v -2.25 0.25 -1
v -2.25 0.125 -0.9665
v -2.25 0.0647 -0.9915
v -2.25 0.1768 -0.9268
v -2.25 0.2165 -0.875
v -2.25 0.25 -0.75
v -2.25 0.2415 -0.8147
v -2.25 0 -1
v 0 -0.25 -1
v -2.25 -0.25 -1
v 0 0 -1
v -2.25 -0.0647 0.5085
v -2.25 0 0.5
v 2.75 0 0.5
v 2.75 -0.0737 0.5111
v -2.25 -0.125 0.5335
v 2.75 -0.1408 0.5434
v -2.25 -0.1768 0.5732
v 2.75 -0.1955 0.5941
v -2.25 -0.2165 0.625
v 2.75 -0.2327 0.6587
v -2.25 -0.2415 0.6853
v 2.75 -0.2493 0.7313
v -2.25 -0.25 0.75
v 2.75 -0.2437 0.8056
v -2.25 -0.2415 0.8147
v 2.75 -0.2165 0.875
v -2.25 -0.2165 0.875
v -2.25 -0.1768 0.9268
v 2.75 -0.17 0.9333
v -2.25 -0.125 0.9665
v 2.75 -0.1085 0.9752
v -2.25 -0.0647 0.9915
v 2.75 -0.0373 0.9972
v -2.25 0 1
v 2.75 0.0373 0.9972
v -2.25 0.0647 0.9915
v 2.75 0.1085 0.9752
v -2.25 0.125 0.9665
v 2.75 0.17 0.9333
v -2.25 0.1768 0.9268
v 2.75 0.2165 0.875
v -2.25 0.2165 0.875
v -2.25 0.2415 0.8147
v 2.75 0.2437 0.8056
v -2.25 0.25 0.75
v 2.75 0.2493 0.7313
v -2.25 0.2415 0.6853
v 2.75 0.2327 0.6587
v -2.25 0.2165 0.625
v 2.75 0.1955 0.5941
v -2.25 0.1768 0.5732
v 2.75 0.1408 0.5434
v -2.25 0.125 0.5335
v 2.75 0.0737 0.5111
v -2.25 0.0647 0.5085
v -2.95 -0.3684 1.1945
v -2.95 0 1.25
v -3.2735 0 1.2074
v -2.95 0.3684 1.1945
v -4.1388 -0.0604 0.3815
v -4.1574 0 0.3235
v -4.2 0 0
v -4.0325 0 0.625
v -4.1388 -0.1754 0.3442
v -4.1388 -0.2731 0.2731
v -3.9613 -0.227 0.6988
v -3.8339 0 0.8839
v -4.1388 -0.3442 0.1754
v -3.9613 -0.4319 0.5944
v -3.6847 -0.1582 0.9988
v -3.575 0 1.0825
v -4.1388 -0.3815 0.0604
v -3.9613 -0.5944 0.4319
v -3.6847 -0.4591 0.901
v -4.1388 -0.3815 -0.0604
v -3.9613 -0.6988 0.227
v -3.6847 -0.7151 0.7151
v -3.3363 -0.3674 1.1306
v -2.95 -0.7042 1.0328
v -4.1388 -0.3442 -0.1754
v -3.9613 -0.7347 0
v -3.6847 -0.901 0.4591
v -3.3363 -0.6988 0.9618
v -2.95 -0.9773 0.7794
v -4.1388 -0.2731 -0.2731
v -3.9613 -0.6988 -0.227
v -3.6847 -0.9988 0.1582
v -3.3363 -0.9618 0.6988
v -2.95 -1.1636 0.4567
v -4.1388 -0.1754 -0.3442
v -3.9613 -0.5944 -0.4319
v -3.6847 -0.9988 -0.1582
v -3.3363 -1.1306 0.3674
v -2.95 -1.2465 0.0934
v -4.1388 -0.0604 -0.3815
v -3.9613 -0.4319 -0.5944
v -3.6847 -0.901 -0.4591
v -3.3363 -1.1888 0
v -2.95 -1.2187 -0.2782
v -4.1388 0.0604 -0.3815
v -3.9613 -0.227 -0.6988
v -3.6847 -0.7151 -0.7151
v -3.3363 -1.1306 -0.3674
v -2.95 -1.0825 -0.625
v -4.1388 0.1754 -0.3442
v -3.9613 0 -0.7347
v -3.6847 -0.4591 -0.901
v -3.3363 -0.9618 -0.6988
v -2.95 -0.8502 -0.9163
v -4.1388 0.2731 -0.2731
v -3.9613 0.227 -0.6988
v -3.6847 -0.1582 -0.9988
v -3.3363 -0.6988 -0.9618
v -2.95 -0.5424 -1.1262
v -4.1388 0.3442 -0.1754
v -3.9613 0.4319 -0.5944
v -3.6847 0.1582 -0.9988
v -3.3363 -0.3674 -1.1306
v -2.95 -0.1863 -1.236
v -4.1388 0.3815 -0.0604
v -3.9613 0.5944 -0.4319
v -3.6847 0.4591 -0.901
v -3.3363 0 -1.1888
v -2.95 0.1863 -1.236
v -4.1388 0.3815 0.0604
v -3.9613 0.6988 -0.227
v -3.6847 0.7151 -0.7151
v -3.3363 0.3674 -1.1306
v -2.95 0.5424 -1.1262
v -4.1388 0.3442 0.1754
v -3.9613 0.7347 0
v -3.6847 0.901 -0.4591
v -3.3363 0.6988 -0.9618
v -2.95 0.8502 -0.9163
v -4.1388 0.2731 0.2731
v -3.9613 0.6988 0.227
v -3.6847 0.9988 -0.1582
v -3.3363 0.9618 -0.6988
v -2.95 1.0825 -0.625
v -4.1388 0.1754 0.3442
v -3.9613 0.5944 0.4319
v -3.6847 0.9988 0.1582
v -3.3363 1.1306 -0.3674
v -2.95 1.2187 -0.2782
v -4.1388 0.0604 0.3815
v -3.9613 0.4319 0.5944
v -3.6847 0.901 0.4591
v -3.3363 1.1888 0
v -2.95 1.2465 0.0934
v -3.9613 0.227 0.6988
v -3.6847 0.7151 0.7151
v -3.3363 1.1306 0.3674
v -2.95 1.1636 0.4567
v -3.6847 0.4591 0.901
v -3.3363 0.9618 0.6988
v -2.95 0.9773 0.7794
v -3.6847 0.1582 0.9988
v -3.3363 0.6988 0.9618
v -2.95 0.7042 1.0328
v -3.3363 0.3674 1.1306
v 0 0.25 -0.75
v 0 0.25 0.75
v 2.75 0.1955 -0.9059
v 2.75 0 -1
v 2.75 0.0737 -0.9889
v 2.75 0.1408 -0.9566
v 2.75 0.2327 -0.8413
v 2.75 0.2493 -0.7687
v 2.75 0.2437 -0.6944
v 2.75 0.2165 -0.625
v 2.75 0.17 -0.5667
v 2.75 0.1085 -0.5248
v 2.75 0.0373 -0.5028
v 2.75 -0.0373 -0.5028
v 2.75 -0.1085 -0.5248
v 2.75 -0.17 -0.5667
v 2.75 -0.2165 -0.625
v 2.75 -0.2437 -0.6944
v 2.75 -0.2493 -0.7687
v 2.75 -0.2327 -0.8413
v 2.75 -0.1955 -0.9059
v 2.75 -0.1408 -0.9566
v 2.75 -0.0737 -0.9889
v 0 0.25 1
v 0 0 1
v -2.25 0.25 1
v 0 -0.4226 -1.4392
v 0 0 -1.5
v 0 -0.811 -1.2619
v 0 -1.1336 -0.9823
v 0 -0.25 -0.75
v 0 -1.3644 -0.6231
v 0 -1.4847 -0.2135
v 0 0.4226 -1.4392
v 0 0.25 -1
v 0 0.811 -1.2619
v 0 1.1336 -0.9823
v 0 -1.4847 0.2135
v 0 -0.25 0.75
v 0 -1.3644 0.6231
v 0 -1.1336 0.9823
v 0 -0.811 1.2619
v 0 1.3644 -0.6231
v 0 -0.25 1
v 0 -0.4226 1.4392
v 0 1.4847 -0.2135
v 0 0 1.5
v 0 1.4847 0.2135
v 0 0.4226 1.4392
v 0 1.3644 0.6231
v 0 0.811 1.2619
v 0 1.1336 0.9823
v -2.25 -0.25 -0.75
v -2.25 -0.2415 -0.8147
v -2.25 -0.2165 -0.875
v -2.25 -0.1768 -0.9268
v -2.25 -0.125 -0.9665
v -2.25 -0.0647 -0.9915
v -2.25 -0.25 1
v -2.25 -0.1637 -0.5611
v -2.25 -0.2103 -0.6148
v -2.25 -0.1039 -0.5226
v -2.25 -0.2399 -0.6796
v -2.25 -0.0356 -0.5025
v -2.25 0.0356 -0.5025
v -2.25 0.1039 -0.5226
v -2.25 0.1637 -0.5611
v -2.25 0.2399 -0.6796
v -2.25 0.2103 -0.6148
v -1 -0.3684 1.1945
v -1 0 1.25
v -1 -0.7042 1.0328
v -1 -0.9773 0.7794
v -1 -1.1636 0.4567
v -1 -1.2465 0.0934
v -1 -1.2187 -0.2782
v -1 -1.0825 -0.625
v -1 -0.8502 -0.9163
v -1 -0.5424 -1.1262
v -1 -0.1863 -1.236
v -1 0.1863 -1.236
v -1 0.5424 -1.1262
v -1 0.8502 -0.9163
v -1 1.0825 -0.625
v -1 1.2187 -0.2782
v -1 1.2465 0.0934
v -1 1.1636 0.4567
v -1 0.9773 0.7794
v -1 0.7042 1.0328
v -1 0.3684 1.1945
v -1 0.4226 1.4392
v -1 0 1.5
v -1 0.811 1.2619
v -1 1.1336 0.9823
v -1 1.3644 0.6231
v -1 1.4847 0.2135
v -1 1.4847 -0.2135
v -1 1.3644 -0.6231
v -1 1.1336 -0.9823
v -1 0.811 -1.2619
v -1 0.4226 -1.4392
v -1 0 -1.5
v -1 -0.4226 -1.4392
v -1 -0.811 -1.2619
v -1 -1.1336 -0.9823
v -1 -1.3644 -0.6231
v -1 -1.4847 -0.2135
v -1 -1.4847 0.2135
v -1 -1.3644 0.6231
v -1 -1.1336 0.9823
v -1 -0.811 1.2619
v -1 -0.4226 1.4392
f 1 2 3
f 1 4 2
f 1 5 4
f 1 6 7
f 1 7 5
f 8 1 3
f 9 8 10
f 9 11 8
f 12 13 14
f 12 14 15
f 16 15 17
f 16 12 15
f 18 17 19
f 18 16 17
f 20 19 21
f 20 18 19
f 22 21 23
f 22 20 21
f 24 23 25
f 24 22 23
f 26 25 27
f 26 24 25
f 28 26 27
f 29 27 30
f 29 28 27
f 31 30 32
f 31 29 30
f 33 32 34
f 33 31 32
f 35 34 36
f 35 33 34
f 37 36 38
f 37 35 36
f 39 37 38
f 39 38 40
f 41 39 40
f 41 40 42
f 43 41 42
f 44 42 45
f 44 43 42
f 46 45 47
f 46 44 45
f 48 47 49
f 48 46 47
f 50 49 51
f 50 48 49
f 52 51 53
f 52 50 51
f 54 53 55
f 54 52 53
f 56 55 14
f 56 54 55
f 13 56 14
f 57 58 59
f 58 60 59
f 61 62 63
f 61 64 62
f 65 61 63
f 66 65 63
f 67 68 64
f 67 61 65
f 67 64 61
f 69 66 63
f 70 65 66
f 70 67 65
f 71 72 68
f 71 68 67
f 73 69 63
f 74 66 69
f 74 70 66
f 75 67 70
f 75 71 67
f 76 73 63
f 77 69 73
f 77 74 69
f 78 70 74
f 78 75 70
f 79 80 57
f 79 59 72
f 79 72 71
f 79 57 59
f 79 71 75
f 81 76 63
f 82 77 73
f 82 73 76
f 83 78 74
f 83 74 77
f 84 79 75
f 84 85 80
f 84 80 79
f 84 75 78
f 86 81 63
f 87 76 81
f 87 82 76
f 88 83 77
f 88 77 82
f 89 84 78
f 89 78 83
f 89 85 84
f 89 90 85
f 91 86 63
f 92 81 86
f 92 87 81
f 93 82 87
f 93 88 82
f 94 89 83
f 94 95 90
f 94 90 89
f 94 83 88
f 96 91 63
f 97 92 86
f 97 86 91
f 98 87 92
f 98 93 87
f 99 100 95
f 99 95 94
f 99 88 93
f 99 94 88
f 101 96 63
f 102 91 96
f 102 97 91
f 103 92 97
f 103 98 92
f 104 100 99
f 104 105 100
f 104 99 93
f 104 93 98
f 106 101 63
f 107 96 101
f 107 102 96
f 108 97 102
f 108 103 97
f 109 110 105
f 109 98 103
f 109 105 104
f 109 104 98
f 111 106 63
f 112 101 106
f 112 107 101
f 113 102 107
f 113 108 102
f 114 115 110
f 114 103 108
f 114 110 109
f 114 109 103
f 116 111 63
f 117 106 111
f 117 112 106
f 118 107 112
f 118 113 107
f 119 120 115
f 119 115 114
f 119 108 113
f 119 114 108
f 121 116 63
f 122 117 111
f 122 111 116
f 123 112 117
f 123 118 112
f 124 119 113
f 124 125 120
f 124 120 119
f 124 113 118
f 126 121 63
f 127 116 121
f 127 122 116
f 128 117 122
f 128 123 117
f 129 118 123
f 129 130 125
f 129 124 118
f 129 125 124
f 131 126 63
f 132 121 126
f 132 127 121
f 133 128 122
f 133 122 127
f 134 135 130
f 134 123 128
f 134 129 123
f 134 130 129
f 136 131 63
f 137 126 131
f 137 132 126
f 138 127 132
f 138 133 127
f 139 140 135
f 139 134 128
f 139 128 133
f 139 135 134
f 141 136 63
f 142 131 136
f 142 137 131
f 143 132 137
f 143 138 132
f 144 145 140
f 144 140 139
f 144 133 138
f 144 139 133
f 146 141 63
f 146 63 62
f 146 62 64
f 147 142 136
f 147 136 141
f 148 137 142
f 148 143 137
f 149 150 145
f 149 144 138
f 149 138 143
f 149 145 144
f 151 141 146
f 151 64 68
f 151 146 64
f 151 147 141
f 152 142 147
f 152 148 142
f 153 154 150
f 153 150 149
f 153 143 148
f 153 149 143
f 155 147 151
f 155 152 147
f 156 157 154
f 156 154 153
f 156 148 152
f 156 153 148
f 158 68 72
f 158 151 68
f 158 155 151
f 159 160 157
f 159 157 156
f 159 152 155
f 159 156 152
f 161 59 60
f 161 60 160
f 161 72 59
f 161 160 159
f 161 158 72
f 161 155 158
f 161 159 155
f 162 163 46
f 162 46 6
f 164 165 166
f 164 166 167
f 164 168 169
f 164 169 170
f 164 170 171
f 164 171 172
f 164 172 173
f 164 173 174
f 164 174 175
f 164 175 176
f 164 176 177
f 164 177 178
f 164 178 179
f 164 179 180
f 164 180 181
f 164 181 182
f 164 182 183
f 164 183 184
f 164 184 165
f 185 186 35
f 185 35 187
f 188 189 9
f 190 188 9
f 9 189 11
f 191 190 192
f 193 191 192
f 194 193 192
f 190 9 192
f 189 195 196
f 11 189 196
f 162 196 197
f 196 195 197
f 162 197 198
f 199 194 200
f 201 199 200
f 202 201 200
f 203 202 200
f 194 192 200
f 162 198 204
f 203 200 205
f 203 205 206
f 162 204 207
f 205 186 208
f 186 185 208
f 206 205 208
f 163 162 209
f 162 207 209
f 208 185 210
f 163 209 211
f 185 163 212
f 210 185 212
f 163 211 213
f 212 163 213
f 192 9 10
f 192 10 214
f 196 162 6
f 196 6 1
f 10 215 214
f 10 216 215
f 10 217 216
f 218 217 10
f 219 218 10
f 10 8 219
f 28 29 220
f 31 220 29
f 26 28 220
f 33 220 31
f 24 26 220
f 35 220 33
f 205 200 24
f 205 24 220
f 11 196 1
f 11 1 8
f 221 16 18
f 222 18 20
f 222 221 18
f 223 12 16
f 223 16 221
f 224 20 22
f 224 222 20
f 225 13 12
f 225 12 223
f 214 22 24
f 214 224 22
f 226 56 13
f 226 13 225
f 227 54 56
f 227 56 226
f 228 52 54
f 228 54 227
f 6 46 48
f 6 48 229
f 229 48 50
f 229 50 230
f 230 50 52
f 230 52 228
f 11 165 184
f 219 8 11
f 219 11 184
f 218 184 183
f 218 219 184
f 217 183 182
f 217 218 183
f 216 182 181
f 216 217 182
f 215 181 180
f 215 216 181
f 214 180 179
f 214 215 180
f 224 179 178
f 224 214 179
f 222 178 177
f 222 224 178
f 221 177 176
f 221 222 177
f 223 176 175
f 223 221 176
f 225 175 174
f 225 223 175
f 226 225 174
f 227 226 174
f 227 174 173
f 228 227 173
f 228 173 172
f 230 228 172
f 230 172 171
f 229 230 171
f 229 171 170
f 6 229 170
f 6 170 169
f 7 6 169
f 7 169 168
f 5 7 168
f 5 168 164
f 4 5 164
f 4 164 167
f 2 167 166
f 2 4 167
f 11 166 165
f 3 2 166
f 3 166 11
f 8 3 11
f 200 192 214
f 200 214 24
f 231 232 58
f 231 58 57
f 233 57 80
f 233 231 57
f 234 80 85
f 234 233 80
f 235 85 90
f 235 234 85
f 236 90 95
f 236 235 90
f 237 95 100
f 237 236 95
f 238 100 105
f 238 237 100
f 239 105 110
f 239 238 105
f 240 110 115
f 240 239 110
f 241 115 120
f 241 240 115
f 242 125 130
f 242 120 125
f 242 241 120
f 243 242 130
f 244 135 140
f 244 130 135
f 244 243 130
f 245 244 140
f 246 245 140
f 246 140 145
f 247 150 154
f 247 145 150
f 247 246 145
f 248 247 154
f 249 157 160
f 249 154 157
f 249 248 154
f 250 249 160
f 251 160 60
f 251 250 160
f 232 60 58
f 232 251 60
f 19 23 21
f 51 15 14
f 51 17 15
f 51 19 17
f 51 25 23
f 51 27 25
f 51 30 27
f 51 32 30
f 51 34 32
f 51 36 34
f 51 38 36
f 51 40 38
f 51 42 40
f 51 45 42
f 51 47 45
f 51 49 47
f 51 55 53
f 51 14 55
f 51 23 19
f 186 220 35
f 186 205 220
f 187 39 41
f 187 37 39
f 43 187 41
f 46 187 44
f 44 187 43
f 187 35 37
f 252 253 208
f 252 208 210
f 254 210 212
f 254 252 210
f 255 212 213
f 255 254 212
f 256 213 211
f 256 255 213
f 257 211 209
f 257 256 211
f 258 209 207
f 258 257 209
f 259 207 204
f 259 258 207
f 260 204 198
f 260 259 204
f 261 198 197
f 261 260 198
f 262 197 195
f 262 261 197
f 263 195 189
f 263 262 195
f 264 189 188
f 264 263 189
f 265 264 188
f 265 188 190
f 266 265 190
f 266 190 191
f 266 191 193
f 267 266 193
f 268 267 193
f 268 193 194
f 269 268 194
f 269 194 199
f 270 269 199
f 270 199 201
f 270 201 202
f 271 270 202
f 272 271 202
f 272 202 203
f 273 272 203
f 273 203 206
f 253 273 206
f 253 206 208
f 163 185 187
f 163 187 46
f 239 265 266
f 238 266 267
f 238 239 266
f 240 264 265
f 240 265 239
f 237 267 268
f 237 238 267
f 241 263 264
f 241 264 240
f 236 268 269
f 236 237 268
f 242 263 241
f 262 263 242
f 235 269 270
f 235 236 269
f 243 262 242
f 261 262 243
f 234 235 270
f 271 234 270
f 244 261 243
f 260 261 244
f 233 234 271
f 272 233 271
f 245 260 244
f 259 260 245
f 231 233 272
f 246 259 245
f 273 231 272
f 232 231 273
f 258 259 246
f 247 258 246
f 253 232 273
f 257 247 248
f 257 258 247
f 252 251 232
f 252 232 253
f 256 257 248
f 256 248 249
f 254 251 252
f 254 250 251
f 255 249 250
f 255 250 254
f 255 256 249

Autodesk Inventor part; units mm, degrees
ref_plane "YZ Plane" through (0, 0, 0) normal (1, 0, 0) x (0, 1, 0)
ref_plane "XZ Plane" through (0, 0, 0) normal (0, 1, 0) x (-1, 0, 0)
ref_plane "XY Plane" through (0, 0, 0) normal (0, 0, 1) x (1, 0, 0)
sketch "Body" plane through (0, 0, 0) normal (0, 1, 0) x (-1, 0, 0)
  line L0 (0, 1.5) -> (0, 0)
  line L1 (0, 1.5) -> (1, 1.5)
  line L2 (1, 1.5) -> (1, 1.25)
  line L3 (0, 0) -> (4.2, 0)
  arc A0 (4.2, 0) -> (2.95, 1.25) centre (2.95, 0) ccw
  line L4 (2.95, 1.25) -> (1, 1.25)
  point P0 (0, 0)
  dimension "d1" = 1
  dimension "d2" = 4.2
  dimension "d3" = 1.5
  dimension "d4" = 0.25
revolve "Revolution1" add sketch "Body" angle 360 about axis through (0, 0, 0) along (-1, 0, 0)
sketch "Sketch2" plane through (0, 0, 0) normal (1, 0, 0) x (0, 0, -1)
  line L0 (-1, 0.25) -> (1, 0.25)
  line L1 (1, 0.25) -> (1, -0.25)
  line L2 (1, -0.25) -> (-1, -0.25)
  line L3 (-1, -0.25) -> (-1, 0.25)
  circle A0 centre (0, 0) radius 1.5 construction
  line L4 (-1, 0) -> (1, 0) construction
  dimension "d9" = 0.5
  dimension "d10" = 0.5
extrude "Extrusion1" cut sketch "Sketch2" against normal blind 2.25
sketch "Sketch3" plane through (-2.25, 0, 0) normal (1, 0, 0) x (0, 0, -1)
  circle A0 centre (-0.75, 0) radius 0.25
  line L0 (-1, 0.25) -> (1, 0.25) construction
  line L1 (1, -0.25) -> (-1, -0.25) construction
  line L2 (-1, -0.25) -> (-1, 0.25) projected
  line L3 (0, 0.25) -> (0, -0.25) construction
  circle A1 centre (0.75, 0) radius 0.25
  point P0 (0, 0)
extrude "Extrusion2" add sketch "Sketch3" along normal blind 5
properties part number "Led3mm"
